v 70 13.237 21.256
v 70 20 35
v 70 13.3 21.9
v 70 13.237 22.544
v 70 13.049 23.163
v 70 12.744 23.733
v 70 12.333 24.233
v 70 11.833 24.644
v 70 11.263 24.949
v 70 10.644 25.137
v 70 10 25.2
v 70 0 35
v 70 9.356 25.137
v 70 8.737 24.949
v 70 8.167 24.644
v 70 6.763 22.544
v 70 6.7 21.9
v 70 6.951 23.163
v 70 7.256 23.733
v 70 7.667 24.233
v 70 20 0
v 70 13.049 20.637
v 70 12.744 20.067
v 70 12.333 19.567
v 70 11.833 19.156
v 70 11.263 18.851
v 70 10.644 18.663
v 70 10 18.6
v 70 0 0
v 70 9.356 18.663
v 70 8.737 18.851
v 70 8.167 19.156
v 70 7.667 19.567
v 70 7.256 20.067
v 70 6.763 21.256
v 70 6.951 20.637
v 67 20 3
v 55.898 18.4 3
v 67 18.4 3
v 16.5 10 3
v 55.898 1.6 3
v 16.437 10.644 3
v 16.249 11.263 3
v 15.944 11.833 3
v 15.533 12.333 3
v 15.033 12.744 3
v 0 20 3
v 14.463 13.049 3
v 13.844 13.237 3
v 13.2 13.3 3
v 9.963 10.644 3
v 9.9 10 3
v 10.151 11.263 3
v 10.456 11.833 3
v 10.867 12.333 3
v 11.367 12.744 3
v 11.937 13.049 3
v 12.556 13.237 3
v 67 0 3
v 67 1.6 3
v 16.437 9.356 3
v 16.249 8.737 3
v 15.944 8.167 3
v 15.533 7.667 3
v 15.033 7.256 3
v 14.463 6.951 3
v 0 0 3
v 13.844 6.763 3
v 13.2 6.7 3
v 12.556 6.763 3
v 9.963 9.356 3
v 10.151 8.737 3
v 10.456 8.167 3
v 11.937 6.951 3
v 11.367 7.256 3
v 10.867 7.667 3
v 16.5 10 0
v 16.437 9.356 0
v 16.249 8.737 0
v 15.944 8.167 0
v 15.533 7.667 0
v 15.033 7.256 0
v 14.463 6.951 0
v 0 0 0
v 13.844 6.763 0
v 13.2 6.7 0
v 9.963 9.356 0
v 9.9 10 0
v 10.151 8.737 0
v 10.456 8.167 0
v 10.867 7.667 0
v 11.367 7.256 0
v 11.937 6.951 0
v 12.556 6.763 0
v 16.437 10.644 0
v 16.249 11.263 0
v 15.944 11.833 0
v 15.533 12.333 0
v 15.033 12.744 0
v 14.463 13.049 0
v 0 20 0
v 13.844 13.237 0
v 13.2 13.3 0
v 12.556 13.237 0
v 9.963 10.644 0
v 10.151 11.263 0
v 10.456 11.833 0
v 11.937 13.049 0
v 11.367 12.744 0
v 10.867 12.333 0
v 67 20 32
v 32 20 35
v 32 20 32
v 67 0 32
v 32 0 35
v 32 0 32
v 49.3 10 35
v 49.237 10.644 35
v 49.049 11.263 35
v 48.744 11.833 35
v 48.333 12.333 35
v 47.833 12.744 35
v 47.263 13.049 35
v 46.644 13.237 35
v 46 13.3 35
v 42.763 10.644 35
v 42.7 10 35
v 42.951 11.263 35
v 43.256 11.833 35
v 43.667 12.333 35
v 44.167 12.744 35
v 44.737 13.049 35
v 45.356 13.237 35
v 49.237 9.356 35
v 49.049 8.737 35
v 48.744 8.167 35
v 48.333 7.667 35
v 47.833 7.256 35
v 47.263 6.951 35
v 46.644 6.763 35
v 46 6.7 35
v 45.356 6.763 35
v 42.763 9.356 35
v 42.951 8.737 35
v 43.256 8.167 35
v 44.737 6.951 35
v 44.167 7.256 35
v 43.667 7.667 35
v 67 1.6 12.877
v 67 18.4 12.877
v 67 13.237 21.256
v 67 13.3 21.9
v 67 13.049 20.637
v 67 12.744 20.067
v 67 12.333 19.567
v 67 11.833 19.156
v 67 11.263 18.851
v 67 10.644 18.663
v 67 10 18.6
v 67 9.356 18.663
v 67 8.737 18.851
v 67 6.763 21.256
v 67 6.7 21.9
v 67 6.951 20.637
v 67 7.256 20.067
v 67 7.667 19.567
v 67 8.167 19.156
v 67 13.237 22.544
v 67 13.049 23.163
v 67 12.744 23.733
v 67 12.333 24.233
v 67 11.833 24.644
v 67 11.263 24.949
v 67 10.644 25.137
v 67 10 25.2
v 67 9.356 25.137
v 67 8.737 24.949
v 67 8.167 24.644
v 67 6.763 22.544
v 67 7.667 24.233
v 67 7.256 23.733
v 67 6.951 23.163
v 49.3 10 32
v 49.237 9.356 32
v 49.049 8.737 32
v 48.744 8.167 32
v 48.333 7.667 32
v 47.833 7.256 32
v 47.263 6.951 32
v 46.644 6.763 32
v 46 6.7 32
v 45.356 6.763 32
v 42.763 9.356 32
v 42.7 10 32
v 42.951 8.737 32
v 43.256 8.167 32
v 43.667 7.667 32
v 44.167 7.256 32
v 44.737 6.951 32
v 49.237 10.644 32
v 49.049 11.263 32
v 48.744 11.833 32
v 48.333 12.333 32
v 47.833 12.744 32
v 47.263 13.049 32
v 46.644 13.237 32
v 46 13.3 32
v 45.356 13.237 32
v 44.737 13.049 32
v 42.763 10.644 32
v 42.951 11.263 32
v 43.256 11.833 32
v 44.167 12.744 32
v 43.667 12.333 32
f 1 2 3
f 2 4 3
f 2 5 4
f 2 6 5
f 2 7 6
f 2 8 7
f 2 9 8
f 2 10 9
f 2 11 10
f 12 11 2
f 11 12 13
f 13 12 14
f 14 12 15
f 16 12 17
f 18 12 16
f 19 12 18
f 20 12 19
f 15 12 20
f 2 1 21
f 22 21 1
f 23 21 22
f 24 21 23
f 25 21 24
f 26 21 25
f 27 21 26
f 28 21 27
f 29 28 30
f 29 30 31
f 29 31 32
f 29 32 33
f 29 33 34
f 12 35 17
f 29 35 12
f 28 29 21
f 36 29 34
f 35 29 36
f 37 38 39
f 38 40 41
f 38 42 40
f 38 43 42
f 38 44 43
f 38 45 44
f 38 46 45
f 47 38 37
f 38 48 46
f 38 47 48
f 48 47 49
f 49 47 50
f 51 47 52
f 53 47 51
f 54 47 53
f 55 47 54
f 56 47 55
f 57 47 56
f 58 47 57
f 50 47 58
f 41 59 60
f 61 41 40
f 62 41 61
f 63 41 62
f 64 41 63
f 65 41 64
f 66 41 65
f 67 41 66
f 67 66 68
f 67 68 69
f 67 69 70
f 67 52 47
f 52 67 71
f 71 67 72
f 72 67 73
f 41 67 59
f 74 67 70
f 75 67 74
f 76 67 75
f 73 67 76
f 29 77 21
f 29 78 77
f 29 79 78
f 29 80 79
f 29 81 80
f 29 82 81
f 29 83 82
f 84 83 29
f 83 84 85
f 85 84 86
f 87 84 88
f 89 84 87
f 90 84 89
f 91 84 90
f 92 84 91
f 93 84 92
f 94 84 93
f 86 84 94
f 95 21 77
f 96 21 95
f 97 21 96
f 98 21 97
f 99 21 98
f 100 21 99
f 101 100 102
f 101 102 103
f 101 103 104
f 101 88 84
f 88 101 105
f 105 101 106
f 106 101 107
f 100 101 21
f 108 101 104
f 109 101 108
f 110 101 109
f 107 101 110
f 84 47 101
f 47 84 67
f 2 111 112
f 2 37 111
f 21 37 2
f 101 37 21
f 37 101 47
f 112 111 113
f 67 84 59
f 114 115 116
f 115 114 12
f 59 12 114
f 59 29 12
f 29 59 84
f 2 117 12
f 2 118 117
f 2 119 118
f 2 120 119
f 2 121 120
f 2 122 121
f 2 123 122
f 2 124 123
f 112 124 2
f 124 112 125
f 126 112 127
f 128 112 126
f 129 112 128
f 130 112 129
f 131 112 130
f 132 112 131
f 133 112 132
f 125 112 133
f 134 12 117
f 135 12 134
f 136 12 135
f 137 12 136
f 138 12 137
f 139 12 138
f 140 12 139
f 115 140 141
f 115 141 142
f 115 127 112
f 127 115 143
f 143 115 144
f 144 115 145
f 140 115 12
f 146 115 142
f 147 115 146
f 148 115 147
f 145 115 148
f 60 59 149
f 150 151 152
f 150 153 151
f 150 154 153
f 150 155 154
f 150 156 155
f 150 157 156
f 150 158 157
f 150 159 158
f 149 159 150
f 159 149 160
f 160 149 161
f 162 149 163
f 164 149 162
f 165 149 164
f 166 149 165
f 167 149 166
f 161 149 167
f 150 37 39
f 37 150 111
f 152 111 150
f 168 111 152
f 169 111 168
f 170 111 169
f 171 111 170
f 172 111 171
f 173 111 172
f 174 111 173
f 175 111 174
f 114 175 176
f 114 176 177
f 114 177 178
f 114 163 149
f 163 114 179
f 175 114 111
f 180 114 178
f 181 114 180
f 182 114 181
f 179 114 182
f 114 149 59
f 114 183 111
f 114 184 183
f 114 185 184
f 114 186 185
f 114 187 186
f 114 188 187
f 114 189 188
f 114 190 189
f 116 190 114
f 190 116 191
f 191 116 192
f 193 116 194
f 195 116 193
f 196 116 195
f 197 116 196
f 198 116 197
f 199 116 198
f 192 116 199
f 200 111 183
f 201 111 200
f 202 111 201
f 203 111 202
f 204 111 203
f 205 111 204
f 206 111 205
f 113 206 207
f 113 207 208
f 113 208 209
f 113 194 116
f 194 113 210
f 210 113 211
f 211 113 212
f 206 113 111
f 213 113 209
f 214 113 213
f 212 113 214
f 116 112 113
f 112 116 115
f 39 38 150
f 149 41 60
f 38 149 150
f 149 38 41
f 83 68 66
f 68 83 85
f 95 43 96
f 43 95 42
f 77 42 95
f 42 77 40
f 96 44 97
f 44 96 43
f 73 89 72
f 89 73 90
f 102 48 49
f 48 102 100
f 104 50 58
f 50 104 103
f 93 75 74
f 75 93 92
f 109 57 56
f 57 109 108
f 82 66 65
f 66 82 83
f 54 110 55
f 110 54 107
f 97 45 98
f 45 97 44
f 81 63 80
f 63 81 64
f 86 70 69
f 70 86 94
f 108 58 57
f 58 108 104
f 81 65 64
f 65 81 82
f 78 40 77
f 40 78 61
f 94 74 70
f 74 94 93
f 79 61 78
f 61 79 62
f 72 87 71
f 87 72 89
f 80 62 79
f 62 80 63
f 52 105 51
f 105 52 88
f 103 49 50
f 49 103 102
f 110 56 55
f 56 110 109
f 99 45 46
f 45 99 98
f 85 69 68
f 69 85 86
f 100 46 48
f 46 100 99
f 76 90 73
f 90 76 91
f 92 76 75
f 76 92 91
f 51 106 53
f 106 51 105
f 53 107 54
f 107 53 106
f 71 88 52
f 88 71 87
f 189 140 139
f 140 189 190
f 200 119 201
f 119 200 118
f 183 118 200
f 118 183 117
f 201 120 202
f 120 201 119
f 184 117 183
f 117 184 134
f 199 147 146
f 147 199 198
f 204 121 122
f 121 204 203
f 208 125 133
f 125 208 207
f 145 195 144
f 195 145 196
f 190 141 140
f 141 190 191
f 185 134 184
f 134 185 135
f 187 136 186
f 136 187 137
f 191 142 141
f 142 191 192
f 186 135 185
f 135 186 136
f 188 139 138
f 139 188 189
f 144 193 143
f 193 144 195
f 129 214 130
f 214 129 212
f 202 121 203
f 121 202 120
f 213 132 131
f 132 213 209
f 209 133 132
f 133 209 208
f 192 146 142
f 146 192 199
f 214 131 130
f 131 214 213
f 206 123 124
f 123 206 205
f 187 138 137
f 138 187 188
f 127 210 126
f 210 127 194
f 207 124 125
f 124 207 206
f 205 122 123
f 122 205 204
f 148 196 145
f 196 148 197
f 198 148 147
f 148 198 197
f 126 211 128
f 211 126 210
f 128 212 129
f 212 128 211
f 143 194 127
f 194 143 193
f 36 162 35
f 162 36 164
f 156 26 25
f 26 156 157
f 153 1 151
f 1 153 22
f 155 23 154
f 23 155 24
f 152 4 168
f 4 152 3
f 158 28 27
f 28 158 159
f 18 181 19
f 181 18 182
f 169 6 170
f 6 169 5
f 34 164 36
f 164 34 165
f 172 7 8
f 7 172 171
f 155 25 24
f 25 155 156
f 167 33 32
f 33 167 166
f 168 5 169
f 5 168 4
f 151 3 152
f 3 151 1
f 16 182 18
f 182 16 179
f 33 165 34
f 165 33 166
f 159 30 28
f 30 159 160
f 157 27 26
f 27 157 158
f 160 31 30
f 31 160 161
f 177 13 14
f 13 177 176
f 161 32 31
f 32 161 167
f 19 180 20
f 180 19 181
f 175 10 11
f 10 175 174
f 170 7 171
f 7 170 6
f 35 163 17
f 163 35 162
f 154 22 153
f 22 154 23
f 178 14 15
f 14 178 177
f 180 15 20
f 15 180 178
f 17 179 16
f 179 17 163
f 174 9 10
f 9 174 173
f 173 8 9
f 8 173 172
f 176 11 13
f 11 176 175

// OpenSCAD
$fn = 32;

// ----------------------------------------------------------------------
// Z-bracket: 70 x 20 x 35 mm
// ----------------------------------------------------------------------

// --- parameters (mm) ---
lower_leg = 70;           // lower foot length, X
upper_leg = 35;           // upper foot length, X
bracket_w = 20;           // bracket width, Y
offset_h = 35;            // overall rise, Z
sheet_t = 3;              // plate thickness
hole_d = 6.6;             // clearance for M6
rib_len = 12.9;           // gusset leg
rib_sink = 1.6;           // gusset overlap into the plates

module hole_z(px, py, z0) {
  translate([px, py, z0 - 2.5]) cylinder(h = sheet_t + 5, d = hole_d);
}
module hole_x(py, pz) {
  translate([-2.5, py, pz]) rotate([0, 90, 0]) cylinder(h = sheet_t + 5, d = hole_d);
}
module gusset(x0) {
  translate([x0, bracket_w - rib_sink, 0])
    rotate([90, 0, 0])
      linear_extrude(height = bracket_w - 2 * rib_sink)
        polygon(points = [[rib_sink, sheet_t - rib_sink],
                          [rib_sink, sheet_t - rib_sink + rib_len],
                          [-rib_len, sheet_t - rib_sink]]);
}

difference() {
  union() {
    cube([lower_leg, bracket_w, sheet_t]);
    /* web, overlapping the lower foot */
    translate([lower_leg - sheet_t, 0, 0]) cube([sheet_t, bracket_w, offset_h]);
    /* upper foot, sunk into the web */
    translate([lower_leg - sheet_t - upper_leg, 0, offset_h - sheet_t]) cube([upper_leg + sheet_t, bracket_w, sheet_t]);
    gusset(lower_leg - sheet_t);
  }
  hole_z(13.2, 10, 0);
  translate([lower_leg - sheet_t - 21, 0, 0]) hole_z(0, 10, offset_h - sheet_t);
  translate([lower_leg - sheet_t, 0, 0]) hole_x(10, 21.9);
}
